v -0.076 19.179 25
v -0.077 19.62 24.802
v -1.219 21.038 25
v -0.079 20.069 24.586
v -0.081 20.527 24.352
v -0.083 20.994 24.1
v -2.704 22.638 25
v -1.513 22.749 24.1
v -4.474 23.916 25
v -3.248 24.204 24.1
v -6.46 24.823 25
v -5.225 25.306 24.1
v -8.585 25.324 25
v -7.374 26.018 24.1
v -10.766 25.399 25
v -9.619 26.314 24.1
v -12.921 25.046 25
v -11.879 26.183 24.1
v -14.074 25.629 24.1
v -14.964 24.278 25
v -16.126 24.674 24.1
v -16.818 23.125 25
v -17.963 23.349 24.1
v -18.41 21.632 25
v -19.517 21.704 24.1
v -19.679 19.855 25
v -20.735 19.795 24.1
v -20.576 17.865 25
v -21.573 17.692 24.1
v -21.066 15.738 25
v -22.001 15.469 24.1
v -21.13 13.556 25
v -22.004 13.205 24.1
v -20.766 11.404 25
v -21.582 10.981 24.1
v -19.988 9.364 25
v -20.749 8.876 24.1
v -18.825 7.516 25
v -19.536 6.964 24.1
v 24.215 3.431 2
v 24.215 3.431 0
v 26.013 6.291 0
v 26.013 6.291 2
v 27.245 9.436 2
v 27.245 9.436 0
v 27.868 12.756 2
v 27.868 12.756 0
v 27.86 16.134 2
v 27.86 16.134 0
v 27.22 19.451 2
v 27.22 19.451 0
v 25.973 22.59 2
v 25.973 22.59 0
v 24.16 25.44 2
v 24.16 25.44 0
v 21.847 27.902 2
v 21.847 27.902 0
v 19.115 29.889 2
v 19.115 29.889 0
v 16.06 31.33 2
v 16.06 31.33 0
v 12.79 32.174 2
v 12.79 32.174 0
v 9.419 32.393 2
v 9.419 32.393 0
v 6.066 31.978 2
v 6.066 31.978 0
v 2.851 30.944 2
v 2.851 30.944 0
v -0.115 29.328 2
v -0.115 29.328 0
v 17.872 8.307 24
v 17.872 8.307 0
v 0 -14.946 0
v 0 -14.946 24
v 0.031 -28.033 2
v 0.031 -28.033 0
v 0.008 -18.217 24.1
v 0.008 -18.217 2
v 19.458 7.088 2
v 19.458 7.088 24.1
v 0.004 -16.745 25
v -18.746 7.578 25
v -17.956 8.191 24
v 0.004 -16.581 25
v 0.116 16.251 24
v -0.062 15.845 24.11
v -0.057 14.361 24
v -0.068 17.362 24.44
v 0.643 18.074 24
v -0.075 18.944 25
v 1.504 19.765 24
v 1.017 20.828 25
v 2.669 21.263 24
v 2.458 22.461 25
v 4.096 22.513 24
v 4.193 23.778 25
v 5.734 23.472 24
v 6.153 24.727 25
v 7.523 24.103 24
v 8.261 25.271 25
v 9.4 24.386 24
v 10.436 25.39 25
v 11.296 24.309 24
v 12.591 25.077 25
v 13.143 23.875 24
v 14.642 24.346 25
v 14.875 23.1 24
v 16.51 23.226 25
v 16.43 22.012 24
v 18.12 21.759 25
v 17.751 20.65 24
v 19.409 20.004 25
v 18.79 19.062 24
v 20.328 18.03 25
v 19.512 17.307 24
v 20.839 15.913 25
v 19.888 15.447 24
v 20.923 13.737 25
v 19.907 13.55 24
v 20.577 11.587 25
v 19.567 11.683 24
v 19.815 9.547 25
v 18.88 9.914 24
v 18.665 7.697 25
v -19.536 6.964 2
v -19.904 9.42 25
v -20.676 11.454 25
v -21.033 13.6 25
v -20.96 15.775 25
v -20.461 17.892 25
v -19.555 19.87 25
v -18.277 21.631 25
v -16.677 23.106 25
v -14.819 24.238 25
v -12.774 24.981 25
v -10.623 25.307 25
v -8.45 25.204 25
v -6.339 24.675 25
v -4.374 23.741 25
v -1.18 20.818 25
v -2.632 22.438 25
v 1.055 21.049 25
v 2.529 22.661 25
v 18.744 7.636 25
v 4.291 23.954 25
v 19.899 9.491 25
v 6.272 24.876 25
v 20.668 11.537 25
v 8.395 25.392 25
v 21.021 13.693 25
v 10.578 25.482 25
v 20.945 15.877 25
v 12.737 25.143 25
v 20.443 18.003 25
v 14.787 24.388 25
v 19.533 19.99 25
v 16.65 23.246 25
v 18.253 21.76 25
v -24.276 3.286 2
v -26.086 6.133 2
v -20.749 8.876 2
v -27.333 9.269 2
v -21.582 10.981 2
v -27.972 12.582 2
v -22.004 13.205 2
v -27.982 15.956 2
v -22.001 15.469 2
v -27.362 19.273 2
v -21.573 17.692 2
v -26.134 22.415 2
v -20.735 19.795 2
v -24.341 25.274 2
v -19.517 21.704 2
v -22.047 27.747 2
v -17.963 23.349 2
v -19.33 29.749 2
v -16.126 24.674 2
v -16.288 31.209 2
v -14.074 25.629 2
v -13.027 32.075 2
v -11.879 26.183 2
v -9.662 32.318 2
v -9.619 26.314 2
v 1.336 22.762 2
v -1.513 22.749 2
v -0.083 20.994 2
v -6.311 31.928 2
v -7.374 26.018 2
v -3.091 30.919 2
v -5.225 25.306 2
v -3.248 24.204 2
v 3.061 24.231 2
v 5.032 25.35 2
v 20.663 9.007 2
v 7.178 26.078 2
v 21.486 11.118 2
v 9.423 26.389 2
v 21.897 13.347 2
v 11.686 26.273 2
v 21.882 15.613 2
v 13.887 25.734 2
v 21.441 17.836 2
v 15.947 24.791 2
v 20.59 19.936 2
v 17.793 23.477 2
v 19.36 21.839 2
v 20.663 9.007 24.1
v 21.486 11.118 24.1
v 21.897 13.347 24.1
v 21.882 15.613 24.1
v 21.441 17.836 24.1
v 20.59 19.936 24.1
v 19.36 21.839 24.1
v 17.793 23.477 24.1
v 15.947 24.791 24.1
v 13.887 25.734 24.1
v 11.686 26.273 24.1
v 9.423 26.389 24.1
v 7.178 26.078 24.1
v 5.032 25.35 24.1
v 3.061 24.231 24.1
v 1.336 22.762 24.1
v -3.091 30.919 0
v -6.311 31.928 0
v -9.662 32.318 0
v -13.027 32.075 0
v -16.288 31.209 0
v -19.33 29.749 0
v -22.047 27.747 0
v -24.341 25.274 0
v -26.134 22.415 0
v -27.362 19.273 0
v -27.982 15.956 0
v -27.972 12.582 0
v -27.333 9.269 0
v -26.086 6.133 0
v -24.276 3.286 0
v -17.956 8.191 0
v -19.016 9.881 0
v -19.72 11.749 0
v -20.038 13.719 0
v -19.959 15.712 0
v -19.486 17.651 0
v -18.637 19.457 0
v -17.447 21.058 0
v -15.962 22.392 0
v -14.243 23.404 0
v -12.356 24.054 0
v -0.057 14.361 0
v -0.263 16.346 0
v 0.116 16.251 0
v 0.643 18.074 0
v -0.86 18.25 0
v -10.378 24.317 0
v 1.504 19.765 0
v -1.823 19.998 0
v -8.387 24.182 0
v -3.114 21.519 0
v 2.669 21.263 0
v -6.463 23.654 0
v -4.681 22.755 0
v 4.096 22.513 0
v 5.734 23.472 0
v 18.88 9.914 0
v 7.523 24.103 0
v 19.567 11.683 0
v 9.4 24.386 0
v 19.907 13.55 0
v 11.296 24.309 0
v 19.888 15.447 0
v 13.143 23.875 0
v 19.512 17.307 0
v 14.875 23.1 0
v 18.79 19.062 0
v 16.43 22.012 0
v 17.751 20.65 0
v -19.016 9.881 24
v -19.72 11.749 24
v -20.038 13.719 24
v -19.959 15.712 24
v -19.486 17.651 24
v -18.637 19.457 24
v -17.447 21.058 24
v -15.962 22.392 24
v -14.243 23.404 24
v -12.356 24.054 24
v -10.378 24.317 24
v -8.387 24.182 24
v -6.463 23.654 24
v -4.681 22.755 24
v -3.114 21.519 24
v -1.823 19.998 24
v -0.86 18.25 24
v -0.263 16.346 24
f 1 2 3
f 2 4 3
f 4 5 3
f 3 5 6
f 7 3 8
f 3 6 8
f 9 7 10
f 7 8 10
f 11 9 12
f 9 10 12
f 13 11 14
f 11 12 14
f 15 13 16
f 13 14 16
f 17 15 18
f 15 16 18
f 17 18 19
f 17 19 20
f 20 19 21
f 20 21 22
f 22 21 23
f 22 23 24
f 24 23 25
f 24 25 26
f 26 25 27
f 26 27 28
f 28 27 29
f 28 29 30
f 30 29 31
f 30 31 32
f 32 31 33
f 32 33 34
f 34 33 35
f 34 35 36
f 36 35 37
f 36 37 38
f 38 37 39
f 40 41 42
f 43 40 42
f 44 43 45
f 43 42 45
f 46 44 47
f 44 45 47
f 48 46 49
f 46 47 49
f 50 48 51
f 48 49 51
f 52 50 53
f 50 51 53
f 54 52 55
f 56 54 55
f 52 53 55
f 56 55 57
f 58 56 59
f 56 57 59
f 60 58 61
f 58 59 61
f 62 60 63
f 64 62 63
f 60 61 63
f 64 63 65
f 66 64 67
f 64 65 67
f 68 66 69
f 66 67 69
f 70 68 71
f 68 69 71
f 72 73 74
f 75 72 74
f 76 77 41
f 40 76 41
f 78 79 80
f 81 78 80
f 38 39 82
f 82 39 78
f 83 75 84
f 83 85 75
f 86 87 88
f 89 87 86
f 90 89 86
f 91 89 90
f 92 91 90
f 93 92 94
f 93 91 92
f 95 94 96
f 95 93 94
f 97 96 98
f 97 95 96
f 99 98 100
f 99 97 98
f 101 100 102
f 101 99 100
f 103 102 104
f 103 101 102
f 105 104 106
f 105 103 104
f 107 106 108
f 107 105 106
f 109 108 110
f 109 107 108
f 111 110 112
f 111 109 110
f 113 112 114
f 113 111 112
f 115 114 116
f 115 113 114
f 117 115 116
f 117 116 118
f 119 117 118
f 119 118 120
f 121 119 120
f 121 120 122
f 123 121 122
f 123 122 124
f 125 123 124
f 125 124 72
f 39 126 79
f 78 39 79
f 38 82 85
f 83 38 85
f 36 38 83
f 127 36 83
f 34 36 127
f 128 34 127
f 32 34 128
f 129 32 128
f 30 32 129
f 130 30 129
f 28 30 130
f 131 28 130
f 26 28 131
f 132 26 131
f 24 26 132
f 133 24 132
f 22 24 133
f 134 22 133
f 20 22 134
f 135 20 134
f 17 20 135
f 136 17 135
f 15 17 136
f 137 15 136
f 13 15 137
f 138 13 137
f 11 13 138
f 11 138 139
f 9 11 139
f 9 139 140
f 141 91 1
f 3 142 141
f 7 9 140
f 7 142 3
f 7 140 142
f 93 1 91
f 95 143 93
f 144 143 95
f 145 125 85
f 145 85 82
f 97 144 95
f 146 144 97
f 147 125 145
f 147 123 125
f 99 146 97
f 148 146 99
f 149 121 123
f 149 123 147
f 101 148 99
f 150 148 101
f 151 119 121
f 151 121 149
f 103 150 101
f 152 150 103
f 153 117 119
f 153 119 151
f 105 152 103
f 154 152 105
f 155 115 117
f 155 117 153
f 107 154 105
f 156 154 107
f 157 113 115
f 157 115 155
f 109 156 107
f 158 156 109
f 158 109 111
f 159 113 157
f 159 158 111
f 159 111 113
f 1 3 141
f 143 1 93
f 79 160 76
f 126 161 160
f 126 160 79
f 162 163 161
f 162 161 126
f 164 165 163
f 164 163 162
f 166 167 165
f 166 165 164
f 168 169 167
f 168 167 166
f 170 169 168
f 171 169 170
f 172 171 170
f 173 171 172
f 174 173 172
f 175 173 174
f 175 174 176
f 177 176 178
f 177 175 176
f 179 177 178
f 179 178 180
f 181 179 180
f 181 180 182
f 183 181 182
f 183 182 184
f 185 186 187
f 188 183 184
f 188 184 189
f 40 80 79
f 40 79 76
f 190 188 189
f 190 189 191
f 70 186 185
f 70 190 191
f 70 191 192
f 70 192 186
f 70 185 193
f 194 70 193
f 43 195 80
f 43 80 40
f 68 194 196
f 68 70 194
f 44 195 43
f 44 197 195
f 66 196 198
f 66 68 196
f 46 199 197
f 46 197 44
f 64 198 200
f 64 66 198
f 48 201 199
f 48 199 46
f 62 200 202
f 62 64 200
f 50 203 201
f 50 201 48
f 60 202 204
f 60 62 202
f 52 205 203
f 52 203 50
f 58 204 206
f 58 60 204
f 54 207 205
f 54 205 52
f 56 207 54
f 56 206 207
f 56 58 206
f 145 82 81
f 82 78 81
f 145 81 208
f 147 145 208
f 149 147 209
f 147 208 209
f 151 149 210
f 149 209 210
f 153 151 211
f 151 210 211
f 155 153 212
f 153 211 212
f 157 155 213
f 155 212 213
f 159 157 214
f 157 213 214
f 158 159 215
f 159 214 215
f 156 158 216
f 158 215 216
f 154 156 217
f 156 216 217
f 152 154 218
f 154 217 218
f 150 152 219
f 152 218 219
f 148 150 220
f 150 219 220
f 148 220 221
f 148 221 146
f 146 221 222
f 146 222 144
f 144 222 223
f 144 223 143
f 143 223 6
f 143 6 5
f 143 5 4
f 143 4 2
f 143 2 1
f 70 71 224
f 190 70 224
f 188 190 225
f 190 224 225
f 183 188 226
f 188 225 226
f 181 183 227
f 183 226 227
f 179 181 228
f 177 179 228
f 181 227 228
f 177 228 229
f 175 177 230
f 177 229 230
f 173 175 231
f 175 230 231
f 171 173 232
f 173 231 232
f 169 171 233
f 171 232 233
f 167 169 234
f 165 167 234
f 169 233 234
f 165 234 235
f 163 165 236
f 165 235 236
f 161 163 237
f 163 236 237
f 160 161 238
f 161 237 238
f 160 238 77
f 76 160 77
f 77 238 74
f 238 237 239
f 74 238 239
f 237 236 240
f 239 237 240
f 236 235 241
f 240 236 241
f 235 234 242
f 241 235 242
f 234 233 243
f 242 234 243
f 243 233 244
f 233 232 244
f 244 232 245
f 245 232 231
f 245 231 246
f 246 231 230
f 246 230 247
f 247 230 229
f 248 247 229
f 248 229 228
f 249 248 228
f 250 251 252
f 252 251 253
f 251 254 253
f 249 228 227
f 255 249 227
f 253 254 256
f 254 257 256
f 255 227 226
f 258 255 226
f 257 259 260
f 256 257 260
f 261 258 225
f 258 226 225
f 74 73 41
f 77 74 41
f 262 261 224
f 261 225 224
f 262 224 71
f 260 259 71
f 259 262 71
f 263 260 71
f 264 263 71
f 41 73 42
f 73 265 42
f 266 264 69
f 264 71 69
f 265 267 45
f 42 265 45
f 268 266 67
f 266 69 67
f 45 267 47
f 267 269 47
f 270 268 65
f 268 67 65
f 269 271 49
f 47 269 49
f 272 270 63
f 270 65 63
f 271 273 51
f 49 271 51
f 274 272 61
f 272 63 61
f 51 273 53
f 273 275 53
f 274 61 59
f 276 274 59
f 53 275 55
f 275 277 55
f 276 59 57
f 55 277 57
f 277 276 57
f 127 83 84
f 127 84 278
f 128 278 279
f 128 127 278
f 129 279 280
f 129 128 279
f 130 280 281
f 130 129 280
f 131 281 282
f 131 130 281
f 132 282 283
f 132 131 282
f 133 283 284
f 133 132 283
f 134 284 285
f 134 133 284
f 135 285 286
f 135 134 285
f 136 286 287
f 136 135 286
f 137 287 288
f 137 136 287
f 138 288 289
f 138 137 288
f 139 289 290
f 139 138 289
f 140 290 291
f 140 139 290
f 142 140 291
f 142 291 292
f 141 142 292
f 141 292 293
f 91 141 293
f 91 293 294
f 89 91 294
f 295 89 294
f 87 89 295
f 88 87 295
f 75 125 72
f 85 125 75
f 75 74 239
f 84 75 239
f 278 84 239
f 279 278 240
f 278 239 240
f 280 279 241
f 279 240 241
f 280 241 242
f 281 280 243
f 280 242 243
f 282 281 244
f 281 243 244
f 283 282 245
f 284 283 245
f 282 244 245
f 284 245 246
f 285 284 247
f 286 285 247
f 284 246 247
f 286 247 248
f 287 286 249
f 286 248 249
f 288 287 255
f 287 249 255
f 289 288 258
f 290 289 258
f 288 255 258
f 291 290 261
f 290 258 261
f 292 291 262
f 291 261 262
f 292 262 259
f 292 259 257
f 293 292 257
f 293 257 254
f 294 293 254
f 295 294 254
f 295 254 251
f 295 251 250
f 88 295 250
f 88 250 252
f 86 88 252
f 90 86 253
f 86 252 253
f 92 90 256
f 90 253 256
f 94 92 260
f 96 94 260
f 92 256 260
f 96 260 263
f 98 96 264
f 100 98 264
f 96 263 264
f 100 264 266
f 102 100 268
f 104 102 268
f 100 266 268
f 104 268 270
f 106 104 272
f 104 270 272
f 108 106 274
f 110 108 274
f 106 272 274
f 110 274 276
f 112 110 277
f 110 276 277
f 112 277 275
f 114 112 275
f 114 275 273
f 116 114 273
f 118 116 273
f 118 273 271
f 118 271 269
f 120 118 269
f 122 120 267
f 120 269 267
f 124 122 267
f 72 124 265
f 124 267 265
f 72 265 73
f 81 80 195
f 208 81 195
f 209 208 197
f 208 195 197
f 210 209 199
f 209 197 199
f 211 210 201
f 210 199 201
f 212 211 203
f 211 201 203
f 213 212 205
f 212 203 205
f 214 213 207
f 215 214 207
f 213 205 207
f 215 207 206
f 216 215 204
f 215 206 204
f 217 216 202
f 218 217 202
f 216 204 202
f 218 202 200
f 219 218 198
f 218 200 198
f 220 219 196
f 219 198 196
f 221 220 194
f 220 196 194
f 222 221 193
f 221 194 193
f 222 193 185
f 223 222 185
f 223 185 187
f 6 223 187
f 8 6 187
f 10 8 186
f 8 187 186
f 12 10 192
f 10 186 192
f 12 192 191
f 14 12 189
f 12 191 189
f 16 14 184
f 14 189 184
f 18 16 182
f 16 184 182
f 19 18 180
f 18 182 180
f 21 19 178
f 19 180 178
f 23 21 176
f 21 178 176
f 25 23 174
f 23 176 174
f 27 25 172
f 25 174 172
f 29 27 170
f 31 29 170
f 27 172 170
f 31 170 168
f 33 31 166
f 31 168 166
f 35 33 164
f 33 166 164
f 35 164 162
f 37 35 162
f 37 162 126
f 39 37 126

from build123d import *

# Parameters (mm, degrees)
F1_DEPTH = 25
F2_SIZE  = 1
F3_SIZE  = 0.9
F4_DEPTH = 2


with BuildPart() as f1:
    # F0 (on Top) → F1 (new body)
    with BuildSketch(Plane.XY):
        with BuildLine():
            ThreePointArc((19.4576948641, 7.0878110017), (16.9014285769, 24.177453273), (-0.0826562467, 20.994493487))
            ThreePointArc((-0.0826562467, 20.994493487), (-17.0758205861, 24.0547884178), (-19.5363304351, 6.9644715509))
            Line((-19.5363304351, 6.9644715509), (0.0076825592, -18.2174257356))
            Line((0.0076825592, -18.2174257356), (19.4576948641, 7.0878110017))
        make_face()
        with BuildLine():
            Line((17.8719759612, 8.3066200764), (0, -14.9455288462))
            Line((0, -14.9455288462), (-17.9563526213, 8.1907138222))
            ThreePointArc((-17.9563526213, 8.1907138222), (-13.3155361336, 23.7759426267), (-0.056541053, 14.3612953145))
            ThreePointArc((-0.056541053, 14.3612953145), (13.1429709457, 23.8749795171), (17.8719759612, 8.3066200764))
        make_face(mode=Mode.SUBTRACT)
    extrude(amount=F1_DEPTH)

    # F2
    f2_edges = [f1.edges().sort_by_distance(p)[0] for p in [
        (-8.978176, -3.377408, 25),
        (8.935988, -3.319454, 25),
        (13.142971, 23.87498, 25),
        (-13.315536, 23.775943, 25),
    ]]
    chamfer(f2_edges, length=F2_SIZE)

    # F3
    f3_edges = [f1.edges().sort_by_distance(p)[0] for p in [
        (-9.764324, -5.626477, 25),
        (-17.075821, 24.054788, 25),
        (16.901429, 24.177453, 25),
        (9.732689, -5.564807, 25),
    ]]
    chamfer(f3_edges, length=F3_SIZE)

    # F0 (on Top) → F4 (join)
    with BuildSketch(Plane.XY):
        with BuildLine():
            Line((0.0307302369, -28.033116404), (24.214851573, 3.4313837773))
            ThreePointArc((24.214851573, 3.4313837773), (23.0617943824, 26.7257310501), (-0.1154648769, 29.3278088692))
            ThreePointArc((-0.1154648769, 29.3278088692), (-23.2520807017, 26.5642978264), (-24.2762638766, 3.285744737))
            Line((-24.2762638766, 3.285744737), (0.0307302369, -28.033116404))
        make_face()
        with BuildLine():
            ThreePointArc((-19.5363304351, 6.9644715509), (-17.0758205861, 24.0547884178), (-0.0826562467, 20.994493487))
            ThreePointArc((-0.0826562467, 20.994493487), (16.9014285769, 24.177453273), (19.4576948641, 7.0878110017))
            Line((19.4576948641, 7.0878110017), (0.0076825592, -18.2174257356))
            Line((0.0076825592, -18.2174257356), (-19.5363304351, 6.9644715509))
        make_face(mode=Mode.SUBTRACT)
    extrude(amount=F4_DEPTH)


solid = f1.part
